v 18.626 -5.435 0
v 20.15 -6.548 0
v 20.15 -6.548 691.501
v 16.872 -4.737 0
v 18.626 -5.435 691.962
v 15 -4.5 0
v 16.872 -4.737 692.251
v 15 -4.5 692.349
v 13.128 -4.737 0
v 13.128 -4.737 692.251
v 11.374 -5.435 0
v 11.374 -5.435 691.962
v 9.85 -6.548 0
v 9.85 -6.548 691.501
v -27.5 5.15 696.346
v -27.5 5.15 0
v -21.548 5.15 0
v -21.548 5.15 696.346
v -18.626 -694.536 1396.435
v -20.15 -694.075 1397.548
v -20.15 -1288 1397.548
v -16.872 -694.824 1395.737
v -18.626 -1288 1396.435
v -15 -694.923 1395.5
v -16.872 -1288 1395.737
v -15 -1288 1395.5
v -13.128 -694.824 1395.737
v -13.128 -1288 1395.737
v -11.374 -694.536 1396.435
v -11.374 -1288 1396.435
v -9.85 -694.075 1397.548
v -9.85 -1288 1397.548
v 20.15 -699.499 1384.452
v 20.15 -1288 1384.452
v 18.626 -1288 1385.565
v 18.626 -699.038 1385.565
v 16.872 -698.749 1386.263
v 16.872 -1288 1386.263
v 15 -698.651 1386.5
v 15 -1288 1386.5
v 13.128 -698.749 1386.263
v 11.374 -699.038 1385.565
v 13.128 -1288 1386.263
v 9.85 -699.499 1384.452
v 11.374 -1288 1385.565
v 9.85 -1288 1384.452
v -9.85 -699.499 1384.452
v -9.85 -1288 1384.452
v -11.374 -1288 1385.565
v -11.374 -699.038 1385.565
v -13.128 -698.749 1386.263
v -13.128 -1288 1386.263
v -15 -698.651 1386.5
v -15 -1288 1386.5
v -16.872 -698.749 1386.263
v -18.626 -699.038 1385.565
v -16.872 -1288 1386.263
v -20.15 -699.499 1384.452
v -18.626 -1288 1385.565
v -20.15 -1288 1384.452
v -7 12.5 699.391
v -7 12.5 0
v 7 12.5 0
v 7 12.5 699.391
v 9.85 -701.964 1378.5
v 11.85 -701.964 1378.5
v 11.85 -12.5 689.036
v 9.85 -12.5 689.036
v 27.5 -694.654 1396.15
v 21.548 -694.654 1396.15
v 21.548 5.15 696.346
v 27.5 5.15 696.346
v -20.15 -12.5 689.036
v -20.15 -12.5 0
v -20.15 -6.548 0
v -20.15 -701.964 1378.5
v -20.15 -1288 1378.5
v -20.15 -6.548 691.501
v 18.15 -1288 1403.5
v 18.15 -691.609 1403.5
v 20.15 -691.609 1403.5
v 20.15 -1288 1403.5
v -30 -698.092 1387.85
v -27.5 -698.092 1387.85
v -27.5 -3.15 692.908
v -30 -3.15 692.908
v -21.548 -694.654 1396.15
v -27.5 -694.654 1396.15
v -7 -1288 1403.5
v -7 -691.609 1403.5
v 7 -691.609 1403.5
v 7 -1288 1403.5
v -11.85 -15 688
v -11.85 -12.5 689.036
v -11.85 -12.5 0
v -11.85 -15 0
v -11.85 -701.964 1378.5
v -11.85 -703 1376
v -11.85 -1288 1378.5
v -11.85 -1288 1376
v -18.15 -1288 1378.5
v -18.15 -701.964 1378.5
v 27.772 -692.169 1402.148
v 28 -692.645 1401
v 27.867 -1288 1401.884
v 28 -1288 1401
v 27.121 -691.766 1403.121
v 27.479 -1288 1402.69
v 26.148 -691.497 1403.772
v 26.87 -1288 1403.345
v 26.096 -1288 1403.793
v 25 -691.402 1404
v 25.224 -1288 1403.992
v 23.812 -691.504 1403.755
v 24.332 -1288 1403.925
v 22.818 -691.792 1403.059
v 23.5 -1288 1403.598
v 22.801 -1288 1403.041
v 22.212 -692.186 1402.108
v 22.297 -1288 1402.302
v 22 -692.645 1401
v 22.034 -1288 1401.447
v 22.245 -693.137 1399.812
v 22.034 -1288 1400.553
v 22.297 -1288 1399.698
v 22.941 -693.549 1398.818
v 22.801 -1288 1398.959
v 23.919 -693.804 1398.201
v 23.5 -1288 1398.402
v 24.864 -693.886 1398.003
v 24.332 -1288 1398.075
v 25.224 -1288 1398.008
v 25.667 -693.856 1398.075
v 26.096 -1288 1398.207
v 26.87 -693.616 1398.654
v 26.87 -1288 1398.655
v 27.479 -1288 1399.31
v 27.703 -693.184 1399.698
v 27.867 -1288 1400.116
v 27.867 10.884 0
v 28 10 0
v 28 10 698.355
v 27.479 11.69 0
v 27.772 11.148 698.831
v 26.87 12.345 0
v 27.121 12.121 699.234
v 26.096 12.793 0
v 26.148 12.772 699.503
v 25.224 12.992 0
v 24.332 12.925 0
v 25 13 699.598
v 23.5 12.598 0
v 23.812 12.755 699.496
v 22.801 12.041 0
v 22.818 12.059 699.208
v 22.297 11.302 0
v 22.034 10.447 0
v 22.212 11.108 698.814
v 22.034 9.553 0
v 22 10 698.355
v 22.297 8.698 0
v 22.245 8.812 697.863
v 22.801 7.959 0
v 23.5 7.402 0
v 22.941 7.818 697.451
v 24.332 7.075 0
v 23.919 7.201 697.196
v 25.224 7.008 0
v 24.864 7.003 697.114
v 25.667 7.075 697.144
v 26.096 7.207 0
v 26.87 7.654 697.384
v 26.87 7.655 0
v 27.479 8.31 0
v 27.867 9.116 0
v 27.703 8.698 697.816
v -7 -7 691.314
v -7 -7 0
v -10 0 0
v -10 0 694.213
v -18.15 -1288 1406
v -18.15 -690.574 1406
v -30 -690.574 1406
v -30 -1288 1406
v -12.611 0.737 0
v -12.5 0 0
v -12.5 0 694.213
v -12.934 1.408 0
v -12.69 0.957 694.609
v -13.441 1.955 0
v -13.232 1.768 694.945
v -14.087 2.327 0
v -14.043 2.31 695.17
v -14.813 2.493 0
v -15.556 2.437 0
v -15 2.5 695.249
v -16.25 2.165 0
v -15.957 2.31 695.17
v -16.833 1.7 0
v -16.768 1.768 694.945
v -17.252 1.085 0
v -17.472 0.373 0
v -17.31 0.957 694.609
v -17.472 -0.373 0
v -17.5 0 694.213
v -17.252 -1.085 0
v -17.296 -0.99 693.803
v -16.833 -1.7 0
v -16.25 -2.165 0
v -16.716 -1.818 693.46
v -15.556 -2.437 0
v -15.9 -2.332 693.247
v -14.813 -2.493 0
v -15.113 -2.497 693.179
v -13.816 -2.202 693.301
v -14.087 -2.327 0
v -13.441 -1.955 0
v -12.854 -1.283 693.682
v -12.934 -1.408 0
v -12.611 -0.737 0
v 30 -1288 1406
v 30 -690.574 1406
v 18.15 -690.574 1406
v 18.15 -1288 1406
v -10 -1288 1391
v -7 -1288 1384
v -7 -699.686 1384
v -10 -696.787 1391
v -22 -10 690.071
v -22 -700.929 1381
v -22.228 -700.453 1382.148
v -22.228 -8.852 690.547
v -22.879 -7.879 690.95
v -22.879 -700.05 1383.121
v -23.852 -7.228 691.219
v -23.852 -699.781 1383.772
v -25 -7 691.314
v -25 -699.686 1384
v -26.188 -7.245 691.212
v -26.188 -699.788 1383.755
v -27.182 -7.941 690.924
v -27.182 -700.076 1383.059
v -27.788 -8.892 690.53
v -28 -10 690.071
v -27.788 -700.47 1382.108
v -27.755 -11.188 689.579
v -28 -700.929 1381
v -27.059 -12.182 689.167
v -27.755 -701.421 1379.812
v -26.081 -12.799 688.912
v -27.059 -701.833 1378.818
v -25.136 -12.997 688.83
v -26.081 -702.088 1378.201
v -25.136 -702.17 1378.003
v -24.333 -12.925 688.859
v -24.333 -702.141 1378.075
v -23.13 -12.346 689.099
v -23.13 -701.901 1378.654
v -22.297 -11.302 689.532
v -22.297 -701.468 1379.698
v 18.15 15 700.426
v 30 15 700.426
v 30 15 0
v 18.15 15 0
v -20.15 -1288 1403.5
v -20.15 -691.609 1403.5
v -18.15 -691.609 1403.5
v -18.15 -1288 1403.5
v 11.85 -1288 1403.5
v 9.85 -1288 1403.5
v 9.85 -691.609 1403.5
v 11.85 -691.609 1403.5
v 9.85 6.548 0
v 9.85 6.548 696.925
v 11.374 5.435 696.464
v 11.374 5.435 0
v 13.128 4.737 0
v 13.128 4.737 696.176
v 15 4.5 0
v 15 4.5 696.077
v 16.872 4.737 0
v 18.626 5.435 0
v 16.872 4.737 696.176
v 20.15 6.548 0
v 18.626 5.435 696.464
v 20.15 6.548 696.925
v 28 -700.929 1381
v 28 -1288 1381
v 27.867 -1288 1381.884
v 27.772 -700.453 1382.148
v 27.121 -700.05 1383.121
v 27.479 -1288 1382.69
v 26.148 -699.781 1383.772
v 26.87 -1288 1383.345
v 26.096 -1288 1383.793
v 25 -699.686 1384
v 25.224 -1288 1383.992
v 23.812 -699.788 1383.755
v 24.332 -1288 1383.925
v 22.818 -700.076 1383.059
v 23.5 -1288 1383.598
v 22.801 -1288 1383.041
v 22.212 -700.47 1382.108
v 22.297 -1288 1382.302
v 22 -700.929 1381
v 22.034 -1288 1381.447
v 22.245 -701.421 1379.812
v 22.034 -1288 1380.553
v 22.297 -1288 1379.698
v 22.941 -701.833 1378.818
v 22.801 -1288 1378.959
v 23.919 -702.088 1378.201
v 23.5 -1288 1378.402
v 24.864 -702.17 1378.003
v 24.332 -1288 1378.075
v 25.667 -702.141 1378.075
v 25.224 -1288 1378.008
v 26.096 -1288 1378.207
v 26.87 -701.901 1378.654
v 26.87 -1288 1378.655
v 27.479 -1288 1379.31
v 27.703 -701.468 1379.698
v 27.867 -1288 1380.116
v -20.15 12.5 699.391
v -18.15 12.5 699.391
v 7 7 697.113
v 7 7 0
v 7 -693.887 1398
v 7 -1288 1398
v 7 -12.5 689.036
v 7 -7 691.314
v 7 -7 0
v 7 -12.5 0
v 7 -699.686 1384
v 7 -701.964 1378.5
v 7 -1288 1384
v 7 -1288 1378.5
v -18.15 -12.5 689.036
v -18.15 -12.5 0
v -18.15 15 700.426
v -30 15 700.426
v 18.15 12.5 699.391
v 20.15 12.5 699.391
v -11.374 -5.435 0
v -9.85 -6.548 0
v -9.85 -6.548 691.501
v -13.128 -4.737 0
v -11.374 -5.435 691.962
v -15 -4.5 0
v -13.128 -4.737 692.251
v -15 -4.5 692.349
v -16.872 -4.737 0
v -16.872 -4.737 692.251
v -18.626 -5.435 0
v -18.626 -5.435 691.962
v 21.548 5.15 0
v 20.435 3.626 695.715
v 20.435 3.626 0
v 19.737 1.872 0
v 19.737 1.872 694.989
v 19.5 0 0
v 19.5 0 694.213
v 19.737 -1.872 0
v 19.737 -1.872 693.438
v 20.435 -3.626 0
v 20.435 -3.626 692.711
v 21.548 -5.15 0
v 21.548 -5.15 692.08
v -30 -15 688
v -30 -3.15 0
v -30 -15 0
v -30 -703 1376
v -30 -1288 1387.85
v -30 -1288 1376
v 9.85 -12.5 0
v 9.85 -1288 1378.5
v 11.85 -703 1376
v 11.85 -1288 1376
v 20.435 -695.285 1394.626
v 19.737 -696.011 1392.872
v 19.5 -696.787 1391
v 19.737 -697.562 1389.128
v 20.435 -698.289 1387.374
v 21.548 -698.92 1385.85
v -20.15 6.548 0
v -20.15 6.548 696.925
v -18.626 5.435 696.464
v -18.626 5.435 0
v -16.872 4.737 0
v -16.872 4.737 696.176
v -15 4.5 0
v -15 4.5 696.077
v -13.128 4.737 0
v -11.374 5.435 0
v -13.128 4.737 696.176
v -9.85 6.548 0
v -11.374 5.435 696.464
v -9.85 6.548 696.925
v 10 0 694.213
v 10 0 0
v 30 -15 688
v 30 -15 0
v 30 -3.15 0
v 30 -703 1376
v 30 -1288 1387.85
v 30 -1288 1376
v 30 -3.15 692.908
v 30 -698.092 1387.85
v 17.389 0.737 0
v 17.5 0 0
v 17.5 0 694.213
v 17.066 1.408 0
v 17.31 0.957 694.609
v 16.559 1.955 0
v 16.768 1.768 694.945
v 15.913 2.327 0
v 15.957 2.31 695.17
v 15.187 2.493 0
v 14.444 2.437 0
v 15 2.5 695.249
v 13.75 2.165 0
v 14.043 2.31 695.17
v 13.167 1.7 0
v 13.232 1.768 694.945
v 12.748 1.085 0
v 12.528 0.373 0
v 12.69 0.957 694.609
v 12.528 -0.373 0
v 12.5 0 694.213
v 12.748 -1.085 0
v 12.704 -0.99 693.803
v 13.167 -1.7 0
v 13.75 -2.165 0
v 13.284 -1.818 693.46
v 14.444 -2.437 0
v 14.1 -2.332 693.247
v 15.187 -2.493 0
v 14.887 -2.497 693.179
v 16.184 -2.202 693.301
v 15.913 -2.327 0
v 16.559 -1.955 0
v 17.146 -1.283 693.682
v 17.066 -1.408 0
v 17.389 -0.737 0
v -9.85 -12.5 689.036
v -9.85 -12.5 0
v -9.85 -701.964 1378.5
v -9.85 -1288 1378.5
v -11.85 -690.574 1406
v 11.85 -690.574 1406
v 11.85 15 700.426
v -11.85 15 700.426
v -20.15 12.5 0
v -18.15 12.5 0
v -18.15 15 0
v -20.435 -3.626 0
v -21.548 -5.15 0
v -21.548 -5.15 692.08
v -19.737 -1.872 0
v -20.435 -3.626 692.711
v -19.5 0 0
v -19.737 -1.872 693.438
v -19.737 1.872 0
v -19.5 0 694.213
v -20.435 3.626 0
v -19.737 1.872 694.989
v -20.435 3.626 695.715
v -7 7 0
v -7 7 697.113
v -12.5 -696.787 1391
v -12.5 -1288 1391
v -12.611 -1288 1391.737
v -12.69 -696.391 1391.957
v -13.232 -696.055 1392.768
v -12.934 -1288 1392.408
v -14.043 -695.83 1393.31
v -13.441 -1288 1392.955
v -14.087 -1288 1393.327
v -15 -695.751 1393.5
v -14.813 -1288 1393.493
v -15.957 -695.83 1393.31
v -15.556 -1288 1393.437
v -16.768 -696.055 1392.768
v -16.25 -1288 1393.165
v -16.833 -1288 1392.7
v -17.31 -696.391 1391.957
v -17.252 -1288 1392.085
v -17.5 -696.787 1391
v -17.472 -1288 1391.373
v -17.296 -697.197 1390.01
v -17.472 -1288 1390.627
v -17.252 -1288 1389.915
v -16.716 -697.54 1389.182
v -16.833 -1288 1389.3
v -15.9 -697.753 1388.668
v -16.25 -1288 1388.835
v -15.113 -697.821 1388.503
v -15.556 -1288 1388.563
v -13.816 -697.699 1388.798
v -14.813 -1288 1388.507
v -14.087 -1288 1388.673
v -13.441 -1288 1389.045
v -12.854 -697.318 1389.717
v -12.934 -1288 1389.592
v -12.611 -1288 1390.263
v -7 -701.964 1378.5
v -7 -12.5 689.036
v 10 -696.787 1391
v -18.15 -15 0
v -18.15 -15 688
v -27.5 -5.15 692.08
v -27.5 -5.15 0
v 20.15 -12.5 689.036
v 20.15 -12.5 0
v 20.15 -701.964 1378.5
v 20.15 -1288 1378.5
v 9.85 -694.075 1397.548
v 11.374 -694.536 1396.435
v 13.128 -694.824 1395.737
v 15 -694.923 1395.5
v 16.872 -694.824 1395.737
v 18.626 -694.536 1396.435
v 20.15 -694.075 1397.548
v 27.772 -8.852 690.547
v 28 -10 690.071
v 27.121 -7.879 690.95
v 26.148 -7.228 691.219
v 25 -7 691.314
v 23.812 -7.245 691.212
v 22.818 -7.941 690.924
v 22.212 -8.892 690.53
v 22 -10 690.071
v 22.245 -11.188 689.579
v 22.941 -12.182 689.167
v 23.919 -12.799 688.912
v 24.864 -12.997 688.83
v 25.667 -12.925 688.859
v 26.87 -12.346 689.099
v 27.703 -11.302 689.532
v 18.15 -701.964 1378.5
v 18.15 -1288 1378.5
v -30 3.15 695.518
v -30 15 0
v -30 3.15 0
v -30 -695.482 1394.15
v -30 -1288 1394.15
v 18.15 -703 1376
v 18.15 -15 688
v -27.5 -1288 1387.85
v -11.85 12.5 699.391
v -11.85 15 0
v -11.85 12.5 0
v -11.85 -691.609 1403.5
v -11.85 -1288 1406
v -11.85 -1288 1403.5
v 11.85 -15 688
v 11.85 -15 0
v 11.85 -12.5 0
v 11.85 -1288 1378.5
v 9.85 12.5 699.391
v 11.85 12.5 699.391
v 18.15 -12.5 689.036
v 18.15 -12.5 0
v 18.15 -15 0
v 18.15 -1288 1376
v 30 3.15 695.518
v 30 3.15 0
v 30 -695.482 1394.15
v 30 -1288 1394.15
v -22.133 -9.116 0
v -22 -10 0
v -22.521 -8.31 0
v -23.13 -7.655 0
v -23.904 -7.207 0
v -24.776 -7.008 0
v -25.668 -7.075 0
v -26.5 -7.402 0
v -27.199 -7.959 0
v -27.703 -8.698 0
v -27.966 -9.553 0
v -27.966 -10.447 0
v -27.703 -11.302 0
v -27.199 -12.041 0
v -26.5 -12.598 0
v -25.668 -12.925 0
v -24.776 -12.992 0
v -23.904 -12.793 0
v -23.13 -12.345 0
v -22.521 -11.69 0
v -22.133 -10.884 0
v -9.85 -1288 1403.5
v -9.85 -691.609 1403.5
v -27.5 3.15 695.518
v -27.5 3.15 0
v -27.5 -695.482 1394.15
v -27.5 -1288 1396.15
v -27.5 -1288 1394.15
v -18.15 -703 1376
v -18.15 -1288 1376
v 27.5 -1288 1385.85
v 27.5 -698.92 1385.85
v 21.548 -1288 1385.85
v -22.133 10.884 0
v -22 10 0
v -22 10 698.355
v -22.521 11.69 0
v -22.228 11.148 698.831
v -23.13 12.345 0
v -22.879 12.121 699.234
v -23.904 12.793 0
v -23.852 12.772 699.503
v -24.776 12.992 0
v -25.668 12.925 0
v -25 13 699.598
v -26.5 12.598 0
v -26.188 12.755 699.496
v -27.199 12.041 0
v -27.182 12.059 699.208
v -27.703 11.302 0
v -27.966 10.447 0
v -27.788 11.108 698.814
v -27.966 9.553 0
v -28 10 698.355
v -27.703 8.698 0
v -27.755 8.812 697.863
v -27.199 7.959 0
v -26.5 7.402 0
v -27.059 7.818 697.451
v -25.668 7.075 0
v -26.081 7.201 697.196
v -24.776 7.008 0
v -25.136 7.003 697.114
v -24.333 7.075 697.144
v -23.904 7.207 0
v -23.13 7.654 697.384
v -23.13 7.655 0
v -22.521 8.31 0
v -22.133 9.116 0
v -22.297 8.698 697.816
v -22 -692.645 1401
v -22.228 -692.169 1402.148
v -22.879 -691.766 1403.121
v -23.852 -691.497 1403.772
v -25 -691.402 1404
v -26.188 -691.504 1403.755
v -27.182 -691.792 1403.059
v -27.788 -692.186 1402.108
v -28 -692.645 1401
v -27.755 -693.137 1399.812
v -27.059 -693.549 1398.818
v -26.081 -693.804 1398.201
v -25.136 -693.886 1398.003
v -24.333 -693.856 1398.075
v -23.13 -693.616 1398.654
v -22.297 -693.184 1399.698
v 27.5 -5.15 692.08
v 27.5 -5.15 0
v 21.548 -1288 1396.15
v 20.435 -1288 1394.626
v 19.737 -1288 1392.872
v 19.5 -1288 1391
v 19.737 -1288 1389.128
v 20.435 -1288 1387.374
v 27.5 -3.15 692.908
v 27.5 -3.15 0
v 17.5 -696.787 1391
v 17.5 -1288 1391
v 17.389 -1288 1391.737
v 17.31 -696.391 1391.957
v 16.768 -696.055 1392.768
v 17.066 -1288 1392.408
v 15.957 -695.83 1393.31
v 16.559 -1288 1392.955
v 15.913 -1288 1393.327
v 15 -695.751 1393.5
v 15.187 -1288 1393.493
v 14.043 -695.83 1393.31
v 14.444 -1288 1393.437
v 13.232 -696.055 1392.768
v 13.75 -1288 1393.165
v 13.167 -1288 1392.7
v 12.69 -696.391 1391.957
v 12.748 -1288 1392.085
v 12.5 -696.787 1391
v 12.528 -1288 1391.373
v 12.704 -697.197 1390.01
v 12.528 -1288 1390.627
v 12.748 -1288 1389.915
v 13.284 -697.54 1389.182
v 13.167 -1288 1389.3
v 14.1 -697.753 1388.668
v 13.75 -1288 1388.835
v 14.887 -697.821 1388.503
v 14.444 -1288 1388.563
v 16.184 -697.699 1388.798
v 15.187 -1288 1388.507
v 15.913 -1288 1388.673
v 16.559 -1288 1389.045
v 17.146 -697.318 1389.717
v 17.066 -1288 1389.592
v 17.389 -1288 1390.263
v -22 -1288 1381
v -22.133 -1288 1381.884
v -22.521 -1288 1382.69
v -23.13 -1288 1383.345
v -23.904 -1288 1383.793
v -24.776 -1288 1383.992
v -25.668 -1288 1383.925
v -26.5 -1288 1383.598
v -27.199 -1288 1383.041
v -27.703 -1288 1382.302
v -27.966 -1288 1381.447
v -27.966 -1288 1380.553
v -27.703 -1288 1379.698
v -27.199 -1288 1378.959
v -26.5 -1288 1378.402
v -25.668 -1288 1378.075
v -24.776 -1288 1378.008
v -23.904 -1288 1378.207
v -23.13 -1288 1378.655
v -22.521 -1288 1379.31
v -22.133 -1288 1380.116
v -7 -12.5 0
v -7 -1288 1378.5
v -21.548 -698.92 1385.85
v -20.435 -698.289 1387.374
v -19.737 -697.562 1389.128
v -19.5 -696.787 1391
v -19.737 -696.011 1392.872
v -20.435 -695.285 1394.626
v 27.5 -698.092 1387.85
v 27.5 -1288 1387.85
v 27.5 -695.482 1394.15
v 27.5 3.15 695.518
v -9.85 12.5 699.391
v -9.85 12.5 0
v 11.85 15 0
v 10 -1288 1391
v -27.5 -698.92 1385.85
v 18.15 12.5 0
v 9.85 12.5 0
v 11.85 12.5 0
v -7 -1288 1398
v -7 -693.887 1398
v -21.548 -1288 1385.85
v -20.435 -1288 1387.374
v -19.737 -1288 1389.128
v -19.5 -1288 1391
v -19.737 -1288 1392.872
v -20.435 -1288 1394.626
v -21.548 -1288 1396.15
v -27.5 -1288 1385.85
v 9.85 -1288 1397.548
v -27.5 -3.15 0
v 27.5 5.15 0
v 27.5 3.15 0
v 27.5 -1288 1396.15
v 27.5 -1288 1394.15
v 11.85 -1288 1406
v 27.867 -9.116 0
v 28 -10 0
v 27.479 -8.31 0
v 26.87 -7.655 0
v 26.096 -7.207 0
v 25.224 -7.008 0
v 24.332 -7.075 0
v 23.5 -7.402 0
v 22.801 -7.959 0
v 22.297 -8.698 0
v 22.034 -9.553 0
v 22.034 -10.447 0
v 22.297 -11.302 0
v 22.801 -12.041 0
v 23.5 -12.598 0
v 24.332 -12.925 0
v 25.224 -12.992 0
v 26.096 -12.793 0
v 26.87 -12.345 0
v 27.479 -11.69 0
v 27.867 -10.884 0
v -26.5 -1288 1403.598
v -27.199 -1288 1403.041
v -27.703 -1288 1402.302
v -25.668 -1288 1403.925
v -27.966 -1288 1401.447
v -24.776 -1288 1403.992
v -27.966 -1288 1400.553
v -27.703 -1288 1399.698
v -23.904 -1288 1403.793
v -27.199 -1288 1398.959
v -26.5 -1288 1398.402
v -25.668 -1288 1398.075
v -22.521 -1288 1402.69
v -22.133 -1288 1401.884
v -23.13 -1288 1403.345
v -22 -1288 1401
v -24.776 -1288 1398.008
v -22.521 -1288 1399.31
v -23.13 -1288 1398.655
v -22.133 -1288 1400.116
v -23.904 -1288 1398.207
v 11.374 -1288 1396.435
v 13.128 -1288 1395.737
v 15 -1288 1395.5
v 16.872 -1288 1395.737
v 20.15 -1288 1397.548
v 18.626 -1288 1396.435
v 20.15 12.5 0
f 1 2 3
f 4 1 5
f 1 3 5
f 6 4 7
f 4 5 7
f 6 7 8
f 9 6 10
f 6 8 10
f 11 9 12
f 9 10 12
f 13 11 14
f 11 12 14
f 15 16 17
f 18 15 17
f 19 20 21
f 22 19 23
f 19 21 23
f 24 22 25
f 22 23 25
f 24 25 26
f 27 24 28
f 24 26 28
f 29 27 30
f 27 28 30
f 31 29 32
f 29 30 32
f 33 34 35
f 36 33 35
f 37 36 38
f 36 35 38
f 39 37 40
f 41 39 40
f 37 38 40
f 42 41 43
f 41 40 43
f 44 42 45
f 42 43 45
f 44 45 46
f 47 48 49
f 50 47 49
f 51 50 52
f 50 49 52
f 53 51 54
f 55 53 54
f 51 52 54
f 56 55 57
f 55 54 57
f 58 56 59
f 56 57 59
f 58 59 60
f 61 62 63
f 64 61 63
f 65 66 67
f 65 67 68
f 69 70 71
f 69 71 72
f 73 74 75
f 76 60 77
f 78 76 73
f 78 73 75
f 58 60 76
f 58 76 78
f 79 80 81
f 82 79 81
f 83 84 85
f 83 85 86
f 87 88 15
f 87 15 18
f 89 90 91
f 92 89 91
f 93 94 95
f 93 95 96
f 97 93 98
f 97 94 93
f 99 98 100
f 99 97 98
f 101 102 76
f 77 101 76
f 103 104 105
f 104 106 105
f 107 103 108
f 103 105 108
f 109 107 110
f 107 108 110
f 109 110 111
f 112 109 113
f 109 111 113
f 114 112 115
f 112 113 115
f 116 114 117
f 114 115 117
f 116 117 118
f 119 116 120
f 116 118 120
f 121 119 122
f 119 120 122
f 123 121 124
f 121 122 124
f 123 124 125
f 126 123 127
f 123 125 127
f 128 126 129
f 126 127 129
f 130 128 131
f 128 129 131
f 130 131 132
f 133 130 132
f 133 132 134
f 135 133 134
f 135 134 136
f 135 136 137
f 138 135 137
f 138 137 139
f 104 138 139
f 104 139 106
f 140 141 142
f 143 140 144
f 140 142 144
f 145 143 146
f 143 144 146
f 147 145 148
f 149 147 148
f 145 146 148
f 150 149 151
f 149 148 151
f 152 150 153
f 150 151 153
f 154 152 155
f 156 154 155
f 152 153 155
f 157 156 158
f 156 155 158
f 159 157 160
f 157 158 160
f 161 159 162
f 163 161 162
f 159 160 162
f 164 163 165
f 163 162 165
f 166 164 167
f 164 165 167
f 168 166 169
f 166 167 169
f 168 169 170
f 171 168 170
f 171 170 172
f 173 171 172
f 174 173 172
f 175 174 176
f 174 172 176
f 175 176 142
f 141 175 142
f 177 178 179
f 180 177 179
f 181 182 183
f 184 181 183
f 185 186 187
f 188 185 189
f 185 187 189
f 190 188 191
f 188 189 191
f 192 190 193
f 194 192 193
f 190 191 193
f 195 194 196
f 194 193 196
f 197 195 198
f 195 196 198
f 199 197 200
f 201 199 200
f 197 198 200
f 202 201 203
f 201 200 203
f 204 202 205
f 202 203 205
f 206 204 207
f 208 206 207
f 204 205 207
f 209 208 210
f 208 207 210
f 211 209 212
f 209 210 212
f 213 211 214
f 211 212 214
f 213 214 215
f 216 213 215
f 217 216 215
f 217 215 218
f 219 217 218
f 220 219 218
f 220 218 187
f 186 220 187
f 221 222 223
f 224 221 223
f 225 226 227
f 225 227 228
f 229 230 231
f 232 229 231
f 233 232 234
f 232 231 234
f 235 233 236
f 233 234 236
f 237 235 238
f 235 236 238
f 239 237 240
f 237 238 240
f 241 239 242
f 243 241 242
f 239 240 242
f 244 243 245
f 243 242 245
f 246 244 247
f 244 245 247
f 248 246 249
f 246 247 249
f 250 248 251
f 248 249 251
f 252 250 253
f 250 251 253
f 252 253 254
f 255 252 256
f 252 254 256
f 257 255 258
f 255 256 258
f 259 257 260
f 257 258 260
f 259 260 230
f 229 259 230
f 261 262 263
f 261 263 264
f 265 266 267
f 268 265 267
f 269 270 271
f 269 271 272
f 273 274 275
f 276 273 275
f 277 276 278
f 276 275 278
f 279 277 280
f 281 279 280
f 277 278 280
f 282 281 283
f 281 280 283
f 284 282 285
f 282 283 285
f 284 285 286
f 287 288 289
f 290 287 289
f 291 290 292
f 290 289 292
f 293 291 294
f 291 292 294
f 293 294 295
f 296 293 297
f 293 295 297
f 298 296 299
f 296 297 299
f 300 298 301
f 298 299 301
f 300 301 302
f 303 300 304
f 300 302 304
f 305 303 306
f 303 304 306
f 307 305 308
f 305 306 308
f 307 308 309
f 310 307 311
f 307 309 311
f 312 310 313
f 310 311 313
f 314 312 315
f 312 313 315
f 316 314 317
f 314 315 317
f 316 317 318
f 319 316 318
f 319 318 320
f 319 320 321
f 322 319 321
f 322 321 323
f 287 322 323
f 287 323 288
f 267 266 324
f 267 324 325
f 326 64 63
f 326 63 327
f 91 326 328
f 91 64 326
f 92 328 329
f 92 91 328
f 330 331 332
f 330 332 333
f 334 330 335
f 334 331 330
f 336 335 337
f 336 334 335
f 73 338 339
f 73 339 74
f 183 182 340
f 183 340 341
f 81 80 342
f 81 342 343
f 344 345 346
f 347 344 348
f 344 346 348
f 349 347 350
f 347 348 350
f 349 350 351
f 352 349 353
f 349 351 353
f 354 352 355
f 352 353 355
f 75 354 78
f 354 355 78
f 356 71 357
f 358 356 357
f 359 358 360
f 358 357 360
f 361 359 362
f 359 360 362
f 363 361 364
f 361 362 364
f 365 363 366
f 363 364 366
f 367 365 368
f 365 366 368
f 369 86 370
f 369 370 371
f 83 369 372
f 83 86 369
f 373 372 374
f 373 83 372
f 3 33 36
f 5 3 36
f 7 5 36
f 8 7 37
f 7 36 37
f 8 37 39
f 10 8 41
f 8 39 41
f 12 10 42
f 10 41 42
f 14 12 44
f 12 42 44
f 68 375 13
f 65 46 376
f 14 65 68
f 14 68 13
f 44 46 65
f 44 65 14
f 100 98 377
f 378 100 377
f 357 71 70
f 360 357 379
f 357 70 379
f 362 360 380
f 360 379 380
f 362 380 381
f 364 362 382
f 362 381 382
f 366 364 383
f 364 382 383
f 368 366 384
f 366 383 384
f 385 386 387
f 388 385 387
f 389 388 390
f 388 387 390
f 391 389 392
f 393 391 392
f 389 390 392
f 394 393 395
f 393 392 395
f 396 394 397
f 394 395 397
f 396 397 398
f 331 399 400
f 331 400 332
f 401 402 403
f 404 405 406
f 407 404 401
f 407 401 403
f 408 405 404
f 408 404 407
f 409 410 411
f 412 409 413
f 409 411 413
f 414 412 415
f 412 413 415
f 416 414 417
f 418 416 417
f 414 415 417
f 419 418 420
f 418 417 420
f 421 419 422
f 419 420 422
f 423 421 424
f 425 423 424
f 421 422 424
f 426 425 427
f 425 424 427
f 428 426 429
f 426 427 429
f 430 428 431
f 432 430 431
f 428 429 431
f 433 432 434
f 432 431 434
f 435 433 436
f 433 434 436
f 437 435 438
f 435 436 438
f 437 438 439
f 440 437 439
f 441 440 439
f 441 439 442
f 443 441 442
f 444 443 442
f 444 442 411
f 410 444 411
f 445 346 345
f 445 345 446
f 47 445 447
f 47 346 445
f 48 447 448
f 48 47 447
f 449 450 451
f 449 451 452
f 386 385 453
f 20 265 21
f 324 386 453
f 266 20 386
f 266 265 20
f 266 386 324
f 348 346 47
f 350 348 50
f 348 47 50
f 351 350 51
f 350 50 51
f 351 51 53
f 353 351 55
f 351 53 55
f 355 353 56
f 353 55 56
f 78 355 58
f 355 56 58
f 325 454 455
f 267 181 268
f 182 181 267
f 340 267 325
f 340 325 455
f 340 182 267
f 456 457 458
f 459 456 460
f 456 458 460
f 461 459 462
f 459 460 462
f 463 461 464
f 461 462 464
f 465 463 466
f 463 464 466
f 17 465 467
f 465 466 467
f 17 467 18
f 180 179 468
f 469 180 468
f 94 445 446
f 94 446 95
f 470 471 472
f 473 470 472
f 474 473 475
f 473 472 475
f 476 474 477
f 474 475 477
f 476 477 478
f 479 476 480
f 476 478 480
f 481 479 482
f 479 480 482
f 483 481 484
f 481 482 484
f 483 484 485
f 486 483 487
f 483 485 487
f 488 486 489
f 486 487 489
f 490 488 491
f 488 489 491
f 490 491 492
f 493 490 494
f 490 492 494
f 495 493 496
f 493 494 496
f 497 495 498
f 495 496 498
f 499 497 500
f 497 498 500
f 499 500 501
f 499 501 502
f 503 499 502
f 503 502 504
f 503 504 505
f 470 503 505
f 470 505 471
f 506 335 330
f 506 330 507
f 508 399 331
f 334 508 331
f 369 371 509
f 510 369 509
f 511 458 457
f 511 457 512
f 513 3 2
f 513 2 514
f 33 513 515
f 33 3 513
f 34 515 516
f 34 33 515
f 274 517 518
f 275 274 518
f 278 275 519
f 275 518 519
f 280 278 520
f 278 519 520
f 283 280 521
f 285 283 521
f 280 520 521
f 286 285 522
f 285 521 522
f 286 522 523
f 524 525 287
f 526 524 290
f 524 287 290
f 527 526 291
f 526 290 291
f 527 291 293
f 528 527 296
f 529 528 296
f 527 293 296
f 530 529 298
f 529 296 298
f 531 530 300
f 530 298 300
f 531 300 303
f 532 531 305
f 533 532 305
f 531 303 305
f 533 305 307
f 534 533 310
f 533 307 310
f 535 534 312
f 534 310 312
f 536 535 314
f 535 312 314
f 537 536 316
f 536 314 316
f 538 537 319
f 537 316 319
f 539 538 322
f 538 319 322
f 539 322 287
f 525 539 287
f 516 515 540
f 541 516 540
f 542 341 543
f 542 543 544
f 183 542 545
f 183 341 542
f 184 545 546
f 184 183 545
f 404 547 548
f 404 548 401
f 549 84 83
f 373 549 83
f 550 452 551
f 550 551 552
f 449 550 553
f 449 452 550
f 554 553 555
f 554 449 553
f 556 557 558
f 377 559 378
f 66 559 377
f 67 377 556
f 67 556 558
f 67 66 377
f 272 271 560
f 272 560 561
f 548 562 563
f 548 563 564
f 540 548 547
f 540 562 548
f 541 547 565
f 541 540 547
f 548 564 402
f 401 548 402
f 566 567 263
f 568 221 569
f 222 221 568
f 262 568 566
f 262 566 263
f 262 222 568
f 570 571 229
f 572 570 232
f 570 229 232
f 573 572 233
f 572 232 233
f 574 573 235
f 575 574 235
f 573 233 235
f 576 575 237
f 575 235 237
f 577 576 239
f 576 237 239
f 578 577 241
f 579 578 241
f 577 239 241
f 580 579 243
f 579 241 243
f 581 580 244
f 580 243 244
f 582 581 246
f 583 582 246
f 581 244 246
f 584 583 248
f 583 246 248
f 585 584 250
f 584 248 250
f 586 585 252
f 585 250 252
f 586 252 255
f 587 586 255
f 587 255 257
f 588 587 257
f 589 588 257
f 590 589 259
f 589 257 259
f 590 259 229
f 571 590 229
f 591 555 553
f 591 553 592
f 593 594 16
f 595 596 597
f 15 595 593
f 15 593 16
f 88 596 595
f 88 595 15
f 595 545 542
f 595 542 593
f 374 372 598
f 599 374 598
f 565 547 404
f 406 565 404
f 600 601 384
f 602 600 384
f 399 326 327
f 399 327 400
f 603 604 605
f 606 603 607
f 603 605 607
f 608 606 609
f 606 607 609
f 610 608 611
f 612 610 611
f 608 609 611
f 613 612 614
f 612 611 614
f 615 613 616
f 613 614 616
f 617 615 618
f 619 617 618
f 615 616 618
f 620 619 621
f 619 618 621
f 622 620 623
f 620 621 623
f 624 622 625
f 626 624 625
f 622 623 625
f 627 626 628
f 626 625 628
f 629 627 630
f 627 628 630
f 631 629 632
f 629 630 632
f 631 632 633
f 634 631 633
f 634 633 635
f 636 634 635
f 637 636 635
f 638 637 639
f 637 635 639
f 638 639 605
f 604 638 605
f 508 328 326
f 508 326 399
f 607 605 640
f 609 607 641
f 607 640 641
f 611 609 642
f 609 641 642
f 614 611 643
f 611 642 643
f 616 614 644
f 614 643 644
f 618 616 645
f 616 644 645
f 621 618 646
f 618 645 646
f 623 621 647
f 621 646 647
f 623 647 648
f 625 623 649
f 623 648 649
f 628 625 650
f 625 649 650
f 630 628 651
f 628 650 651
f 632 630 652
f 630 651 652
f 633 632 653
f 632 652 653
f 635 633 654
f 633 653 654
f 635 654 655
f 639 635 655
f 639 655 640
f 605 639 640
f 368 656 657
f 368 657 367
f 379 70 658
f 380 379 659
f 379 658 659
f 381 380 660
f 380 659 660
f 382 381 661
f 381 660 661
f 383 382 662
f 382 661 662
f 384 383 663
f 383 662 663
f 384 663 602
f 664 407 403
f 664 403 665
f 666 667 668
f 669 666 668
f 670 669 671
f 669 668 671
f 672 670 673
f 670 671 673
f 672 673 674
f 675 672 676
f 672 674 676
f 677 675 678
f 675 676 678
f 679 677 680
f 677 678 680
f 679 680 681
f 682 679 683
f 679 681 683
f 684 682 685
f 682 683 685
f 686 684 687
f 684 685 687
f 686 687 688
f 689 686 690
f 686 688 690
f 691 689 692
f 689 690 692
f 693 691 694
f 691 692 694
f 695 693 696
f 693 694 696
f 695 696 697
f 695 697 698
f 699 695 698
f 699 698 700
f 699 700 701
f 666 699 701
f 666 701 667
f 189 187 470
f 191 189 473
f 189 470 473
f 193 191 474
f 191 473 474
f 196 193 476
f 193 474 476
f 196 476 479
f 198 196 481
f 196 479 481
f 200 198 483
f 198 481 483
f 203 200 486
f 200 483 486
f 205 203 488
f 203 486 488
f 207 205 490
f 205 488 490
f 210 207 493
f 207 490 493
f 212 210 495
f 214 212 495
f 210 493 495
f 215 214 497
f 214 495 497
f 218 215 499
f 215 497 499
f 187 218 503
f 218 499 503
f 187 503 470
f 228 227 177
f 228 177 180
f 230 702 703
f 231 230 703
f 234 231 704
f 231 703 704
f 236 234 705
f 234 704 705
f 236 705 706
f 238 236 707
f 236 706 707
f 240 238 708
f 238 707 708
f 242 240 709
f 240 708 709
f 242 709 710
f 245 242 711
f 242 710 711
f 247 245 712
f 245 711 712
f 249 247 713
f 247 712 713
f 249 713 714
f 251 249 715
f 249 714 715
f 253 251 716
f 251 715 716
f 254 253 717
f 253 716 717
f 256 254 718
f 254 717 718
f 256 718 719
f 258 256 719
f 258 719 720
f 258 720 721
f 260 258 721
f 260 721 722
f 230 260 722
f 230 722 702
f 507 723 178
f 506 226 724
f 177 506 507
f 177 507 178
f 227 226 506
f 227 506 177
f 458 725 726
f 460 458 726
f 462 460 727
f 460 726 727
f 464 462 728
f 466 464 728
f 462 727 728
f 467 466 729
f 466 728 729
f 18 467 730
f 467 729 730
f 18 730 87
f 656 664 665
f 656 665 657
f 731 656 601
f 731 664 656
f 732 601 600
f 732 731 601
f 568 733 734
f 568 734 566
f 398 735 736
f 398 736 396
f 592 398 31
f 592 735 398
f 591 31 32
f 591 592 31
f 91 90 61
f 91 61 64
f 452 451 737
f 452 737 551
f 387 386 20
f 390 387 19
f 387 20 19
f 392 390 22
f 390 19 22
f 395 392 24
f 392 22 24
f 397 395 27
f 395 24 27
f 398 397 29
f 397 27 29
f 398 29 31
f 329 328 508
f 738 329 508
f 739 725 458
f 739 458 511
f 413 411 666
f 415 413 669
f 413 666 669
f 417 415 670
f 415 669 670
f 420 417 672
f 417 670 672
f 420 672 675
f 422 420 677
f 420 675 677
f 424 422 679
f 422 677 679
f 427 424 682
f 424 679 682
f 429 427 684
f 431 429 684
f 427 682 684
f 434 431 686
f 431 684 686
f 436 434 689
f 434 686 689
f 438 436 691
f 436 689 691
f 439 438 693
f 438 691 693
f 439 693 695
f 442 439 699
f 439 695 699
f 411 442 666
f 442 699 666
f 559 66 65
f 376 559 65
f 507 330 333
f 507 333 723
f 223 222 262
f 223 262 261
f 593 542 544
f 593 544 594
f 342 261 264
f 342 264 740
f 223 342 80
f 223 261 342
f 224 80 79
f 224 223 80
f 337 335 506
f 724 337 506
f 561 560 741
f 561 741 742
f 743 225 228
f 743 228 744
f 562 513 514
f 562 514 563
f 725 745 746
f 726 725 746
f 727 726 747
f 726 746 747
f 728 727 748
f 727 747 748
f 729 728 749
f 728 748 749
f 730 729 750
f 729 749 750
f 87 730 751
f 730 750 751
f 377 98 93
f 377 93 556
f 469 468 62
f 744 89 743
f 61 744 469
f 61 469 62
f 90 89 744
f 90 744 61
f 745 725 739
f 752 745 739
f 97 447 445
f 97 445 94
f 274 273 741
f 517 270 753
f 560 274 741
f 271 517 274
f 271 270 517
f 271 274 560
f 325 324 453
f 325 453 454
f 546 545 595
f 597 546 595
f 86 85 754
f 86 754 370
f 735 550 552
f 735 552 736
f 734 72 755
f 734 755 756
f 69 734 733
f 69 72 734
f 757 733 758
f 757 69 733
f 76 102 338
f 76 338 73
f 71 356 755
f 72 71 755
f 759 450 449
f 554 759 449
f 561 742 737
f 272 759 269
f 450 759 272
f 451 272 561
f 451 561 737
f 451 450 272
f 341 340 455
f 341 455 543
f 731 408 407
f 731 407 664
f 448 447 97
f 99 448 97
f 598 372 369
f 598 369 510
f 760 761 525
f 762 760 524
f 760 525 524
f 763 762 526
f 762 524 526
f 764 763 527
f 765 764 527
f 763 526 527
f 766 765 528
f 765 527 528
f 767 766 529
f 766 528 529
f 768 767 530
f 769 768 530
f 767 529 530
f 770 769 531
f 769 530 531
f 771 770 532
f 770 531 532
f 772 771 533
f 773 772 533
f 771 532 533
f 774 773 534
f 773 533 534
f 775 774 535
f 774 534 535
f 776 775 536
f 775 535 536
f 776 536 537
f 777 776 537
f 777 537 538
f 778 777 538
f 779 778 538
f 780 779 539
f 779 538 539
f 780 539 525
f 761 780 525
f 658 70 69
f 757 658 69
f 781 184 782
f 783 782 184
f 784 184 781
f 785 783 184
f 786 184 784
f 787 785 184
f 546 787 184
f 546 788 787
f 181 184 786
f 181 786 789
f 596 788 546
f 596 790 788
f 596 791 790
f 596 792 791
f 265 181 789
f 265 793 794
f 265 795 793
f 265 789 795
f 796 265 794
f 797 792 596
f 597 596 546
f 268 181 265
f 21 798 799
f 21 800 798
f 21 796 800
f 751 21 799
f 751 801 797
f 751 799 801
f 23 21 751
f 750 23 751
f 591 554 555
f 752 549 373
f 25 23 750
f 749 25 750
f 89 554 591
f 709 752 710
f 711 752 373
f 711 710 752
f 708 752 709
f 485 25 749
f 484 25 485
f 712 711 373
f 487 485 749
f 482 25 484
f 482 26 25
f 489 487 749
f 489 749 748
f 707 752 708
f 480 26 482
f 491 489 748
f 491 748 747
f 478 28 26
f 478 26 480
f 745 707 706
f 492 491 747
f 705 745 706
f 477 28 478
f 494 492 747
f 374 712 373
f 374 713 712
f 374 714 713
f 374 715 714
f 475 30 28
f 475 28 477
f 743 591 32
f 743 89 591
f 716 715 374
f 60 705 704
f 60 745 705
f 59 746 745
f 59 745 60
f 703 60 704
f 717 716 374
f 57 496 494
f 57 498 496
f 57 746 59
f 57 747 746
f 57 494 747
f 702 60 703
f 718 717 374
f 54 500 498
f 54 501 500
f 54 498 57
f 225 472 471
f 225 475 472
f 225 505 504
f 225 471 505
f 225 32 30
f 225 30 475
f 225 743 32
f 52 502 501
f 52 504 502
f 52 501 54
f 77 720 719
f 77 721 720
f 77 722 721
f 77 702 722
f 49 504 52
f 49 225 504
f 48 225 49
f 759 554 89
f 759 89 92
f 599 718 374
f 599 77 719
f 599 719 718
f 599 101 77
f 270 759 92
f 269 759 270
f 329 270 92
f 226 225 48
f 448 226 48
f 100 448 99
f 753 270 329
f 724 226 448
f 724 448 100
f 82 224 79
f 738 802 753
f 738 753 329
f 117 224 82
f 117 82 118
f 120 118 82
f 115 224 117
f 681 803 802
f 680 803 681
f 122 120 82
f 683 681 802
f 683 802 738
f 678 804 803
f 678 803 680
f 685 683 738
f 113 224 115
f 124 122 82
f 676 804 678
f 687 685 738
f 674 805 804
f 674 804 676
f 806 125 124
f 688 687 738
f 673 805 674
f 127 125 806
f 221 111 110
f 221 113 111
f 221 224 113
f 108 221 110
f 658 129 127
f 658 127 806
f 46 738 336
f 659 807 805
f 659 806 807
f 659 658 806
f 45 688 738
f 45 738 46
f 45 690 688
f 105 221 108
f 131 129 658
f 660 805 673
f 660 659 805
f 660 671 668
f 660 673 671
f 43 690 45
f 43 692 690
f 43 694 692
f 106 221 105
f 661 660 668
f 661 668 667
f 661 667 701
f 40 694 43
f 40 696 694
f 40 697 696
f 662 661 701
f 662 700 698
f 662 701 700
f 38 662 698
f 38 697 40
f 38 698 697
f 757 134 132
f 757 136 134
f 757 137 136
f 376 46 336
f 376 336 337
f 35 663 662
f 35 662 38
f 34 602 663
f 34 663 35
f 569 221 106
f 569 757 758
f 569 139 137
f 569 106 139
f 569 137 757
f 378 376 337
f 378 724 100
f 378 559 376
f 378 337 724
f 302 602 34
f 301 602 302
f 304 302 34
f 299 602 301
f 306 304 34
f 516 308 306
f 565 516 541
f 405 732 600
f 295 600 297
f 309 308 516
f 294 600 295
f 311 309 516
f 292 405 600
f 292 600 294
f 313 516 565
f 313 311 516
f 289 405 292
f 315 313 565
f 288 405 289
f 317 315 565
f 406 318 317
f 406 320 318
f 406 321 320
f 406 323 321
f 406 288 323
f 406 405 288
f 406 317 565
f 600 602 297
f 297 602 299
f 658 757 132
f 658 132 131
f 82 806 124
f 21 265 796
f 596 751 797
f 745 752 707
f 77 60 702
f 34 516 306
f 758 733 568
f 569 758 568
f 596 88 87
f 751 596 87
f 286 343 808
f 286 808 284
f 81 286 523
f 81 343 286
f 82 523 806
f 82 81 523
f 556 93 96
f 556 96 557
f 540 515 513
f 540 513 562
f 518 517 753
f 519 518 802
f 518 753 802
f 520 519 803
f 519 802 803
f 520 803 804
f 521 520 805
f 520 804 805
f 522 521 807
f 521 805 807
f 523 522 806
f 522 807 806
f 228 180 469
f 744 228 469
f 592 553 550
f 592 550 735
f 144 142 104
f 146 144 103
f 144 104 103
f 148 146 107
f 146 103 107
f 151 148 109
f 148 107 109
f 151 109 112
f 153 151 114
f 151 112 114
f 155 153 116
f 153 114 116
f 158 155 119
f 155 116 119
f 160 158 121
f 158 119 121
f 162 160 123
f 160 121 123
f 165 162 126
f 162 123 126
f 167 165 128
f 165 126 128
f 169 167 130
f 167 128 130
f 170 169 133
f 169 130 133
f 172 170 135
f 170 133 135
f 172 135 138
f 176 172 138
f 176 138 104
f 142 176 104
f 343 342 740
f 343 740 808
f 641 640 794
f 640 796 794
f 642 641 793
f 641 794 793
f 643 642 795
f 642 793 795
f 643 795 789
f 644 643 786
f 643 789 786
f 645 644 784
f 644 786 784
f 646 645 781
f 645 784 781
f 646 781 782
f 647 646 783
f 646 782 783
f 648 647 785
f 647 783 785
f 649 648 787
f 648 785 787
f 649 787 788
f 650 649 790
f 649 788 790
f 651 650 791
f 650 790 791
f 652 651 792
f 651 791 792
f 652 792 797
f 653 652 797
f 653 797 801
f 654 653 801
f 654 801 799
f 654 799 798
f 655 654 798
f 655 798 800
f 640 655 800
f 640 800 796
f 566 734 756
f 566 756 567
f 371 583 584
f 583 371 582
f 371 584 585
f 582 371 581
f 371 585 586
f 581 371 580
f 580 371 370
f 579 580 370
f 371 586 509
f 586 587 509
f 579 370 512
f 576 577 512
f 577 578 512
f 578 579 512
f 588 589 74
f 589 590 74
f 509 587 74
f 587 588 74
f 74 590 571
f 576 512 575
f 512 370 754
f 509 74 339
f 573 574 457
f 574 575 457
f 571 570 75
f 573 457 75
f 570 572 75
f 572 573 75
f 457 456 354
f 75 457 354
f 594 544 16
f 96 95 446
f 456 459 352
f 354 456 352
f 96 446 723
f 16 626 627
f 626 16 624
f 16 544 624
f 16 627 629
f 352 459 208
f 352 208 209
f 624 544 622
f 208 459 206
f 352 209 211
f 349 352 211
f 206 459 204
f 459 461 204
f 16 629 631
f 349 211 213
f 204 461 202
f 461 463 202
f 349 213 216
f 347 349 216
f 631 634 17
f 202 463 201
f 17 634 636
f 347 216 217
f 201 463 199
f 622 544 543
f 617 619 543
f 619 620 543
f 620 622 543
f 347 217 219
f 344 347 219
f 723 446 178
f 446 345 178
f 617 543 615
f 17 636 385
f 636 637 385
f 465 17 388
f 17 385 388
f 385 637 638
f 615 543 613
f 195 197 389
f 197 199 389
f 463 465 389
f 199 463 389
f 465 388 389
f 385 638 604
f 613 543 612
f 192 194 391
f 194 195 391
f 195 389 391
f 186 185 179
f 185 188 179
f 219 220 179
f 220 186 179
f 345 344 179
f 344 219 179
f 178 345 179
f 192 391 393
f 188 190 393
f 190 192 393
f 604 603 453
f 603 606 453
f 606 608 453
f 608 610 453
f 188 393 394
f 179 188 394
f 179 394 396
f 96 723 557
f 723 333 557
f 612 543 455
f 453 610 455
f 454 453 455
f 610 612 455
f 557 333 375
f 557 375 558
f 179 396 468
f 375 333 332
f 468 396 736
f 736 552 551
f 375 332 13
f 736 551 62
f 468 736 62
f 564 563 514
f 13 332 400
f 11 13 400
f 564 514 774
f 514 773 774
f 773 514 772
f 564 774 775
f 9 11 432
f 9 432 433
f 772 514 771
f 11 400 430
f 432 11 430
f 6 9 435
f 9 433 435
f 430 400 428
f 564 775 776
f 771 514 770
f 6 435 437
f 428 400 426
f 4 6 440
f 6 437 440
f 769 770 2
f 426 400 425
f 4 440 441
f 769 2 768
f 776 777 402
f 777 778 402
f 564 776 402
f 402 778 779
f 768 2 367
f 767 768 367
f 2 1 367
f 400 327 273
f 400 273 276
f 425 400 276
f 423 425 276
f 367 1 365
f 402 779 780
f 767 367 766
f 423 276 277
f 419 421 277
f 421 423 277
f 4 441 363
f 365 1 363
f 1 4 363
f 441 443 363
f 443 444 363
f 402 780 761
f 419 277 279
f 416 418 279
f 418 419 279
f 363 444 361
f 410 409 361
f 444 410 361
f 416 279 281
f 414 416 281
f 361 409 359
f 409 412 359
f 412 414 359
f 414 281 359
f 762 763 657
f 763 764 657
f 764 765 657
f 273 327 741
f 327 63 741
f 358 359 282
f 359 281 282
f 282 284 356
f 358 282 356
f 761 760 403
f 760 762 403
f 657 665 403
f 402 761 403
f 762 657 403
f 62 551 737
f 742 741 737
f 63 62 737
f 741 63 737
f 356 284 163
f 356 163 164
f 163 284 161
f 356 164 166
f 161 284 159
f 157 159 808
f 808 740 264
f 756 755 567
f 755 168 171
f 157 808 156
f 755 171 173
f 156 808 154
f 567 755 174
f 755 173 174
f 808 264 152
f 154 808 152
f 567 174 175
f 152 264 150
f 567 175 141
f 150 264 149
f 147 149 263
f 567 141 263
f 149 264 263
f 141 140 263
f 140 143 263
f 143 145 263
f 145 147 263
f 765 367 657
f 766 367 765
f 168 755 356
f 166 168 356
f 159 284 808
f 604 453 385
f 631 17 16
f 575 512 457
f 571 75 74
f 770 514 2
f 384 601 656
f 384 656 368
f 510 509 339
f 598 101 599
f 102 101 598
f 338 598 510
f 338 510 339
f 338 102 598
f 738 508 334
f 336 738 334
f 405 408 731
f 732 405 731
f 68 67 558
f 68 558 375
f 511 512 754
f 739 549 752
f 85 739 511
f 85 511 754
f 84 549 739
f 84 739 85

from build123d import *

# Parameters (mm, degrees)
F0_R   = 3
F0_R_2 = 2.5


with BuildPart() as f2:
    # F2: sweep along a path in F1
    with BuildLine(Plane.YZ) as f2_path:
        Line((-15, 0), (-15, 688))
        Line((-15, 688), (-703, 1376))
        Line((-703, 1376), (-1288, 1376))
    # F0 (on Top) → F2 (sweep)
    with BuildSketch(Plane.XY):
        with BuildLine():
            Line((18.15, -15), (30, -15))
            Line((30, -15), (30, -3.15))
            Line((30, -3.15), (27.5, -3.15))
            Line((27.5, -3.15), (27.5, -5.15))
            Line((27.5, -5.15), (21.5477069044, -5.15))
            ThreePointArc((21.5477069044, -5.15), (19.5, 0), (21.5477069044, 5.15))
            Line((21.5477069044, 5.15), (27.5, 5.15))
            Line((27.5, 5.15), (27.5, 3.15))
            Line((27.5, 3.15), (30, 3.15))
            Line((30, 3.15), (30, 15))
            Line((30, 15), (18.15, 15))
            Line((18.15, 15), (18.15, 12.5))
            Line((18.15, 12.5), (20.15, 12.5))
            Line((20.15, 12.5), (20.15, 6.5477069044))
            ThreePointArc((20.15, 6.5477069044), (15, 4.5), (9.85, 6.5477069044))
            Line((9.85, 6.5477069044), (9.85, 12.5))
            Line((9.85, 12.5), (11.85, 12.5))
            Line((11.85, 12.5), (11.85, 15))
            Line((11.85, 15), (-11.85, 15))
            Line((-11.85, 15), (-11.85, 12.5))
            Line((-11.85, 12.5), (-9.85, 12.5))
            Line((-9.85, 12.5), (-9.85, 6.5477069044))
            ThreePointArc((-9.85, 6.5477069044), (-15, 4.5), (-20.15, 6.5477069044))
            Line((-20.15, 6.5477069044), (-20.15, 12.5))
            Line((-20.15, 12.5), (-18.15, 12.5))
            Line((-18.15, 12.5), (-18.15, 15))
            Line((-18.15, 15), (-30, 15))
            Line((-30, 15), (-30, 3.15))
            Line((-30, 3.15), (-27.5, 3.15))
            Line((-27.5, 3.15), (-27.5, 5.15))
            Line((-27.5, 5.15), (-21.5477069044, 5.15))
            ThreePointArc((-21.5477069044, 5.15), (-19.5, 0), (-21.5477069044, -5.15))
            Line((-21.5477069044, -5.15), (-27.5, -5.15))
            Line((-27.5, -5.15), (-27.5, -3.15))
            Line((-27.5, -3.15), (-30, -3.15))
            Line((-30, -3.15), (-30, -15))
            Line((-30, -15), (-18.15, -15))
            Line((-18.15, -15), (-18.15, -12.5))
            Line((-18.15, -12.5), (-20.15, -12.5))
            Line((-20.15, -12.5), (-20.15, -6.5477069044))
            ThreePointArc((-20.15, -6.5477069044), (-15, -4.5), (-9.85, -6.5477069044))
            Line((-9.85, -6.5477069044), (-9.85, -12.5))
            Line((-9.85, -12.5), (-11.85, -12.5))
            Line((-11.85, -12.5), (-11.85, -15))
            Line((-11.85, -15), (11.85, -15))
            Line((11.85, -15), (11.85, -12.5))
            Line((11.85, -12.5), (9.85, -12.5))
            Line((9.85, -12.5), (9.85, -6.5477069044))
            ThreePointArc((9.85, -6.5477069044), (15, -4.5), (20.15, -6.5477069044))
            Line((20.15, -6.5477069044), (20.15, -12.5))
            Line((20.15, -12.5), (18.15, -12.5))
            Line((18.15, -12.5), (18.15, -15))
        make_face()
        with Locations((-25, -10)):
            Circle(F0_R, mode=Mode.SUBTRACT)
        with Locations((25, -10)):
            Circle(F0_R, mode=Mode.SUBTRACT)
        with Locations((-15, 0)):
            Circle(F0_R_2, mode=Mode.SUBTRACT)
        with Locations((-25, 10)):
            Circle(F0_R, mode=Mode.SUBTRACT)
        Polygon((-7, 7), (-7, 12.5), (0, 12.5), (7, 12.5), (7, 7), (10, 0), (7, -7), (7, -12.5), (0, -12.5), (-7, -12.5), (-7, -7), (-10, 0), align=None, mode=Mode.SUBTRACT)
        with Locations((15, 0)):
            Circle(F0_R_2, mode=Mode.SUBTRACT)
        with Locations((25, 10)):
            Circle(F0_R, mode=Mode.SUBTRACT)
    sweep(path=f2_path.line, transition=Transition.RIGHT)


solid = f2.part
